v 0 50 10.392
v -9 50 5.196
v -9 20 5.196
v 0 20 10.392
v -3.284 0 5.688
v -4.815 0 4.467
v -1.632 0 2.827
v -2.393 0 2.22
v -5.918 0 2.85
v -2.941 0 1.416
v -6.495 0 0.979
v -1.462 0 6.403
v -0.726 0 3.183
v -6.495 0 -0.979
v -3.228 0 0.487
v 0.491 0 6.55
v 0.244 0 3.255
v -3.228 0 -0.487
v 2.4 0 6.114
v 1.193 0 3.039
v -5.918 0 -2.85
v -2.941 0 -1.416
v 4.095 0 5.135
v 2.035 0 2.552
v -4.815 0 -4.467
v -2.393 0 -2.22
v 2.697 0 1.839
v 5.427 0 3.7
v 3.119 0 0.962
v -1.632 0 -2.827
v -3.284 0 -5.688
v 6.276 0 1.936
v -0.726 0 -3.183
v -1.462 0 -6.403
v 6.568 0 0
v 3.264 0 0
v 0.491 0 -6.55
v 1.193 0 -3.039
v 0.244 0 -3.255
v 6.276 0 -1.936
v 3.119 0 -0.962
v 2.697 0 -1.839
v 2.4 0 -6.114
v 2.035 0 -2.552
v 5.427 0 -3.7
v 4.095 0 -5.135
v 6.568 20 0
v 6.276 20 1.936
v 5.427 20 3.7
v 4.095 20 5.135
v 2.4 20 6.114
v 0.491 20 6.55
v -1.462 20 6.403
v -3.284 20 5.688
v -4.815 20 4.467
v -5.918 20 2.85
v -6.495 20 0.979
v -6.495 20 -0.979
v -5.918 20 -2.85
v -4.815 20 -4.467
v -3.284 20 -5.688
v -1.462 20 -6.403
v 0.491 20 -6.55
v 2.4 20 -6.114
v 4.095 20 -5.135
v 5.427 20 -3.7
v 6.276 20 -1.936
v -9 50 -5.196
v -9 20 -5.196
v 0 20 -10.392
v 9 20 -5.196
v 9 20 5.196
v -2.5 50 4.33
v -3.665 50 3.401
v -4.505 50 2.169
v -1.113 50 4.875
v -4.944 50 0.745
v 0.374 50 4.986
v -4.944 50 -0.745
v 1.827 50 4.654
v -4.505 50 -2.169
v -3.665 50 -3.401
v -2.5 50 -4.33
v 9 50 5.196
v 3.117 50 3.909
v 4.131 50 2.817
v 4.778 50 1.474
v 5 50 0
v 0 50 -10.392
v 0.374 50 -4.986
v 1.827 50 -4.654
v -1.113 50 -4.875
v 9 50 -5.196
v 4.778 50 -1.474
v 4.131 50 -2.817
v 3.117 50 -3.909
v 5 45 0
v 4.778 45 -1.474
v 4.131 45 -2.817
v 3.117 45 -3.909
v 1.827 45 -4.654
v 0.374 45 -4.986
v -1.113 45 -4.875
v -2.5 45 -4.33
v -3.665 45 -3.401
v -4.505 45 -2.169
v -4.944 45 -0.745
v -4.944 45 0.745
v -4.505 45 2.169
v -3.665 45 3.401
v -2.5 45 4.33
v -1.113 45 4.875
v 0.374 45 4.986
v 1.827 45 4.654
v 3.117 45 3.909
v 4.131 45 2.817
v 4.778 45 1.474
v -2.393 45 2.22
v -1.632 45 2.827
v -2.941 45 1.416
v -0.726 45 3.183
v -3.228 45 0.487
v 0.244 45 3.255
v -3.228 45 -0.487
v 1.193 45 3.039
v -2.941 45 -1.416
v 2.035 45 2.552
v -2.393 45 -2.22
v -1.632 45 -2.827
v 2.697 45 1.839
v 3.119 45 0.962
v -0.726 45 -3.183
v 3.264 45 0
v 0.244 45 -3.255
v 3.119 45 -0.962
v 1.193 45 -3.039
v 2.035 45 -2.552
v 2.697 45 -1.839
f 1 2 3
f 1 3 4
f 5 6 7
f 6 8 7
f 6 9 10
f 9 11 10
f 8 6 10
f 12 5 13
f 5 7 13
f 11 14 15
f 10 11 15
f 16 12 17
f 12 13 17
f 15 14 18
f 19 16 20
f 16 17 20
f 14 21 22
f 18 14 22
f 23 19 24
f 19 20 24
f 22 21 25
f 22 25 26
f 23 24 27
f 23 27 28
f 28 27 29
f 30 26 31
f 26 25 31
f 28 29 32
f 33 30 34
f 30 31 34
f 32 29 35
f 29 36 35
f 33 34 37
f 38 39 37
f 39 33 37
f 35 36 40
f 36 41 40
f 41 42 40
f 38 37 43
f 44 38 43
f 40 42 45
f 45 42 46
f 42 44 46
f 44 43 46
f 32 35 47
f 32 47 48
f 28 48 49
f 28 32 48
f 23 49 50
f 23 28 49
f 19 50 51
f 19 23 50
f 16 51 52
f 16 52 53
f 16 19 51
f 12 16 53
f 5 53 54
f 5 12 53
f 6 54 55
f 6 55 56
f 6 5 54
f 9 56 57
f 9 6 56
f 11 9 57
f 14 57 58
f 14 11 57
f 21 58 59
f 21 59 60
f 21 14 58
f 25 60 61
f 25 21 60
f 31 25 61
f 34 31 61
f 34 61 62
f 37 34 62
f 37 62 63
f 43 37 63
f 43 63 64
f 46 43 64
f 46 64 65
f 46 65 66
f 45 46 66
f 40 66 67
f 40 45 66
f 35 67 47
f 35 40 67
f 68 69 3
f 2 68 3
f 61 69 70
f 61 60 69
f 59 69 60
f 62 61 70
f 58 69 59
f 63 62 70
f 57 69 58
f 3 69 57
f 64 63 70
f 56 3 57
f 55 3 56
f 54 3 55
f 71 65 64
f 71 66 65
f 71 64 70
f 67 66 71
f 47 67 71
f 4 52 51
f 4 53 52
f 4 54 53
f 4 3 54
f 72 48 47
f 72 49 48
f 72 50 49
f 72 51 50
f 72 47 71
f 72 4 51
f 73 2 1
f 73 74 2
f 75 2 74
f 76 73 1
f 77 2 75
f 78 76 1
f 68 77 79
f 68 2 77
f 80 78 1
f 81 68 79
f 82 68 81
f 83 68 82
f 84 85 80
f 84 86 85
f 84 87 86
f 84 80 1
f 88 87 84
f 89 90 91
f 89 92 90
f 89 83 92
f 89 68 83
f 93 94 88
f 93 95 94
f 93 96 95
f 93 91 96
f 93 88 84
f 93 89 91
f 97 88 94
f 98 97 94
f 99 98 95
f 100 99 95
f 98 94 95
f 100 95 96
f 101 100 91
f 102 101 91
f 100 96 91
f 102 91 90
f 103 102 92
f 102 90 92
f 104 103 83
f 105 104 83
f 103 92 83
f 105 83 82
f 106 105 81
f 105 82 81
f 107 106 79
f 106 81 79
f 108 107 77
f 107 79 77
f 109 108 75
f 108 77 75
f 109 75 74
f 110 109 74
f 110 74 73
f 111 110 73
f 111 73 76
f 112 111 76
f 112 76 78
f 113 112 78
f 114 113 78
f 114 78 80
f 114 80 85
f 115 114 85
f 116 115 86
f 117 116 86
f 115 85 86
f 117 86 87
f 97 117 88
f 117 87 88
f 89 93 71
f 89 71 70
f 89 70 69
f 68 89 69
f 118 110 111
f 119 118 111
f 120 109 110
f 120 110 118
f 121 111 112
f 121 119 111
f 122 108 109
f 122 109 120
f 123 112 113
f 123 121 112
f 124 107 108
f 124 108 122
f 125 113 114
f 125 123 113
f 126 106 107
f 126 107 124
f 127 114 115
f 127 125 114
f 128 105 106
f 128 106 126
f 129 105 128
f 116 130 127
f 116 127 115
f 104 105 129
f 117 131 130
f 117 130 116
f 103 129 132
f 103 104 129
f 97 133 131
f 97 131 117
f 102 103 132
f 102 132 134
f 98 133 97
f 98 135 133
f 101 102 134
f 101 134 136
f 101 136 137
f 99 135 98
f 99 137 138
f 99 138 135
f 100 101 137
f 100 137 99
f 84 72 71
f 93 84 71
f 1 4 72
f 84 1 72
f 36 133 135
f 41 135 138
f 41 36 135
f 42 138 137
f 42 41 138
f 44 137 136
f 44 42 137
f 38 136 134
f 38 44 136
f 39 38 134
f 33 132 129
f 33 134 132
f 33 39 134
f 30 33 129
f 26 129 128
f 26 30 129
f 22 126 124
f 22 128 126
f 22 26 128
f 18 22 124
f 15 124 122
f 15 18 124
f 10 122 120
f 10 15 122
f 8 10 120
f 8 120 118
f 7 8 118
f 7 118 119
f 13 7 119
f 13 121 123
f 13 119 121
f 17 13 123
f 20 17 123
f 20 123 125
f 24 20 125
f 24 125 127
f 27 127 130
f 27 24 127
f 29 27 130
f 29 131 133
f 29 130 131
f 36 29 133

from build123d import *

# Parameters (mm, degrees)
SKETCH_1_R          = 3.264424224
EXTRUDE_1_DEPTH     = 50
SKETCH_2_OUTSIDE_W  = 31.412
SKETCH_2_OUTSIDE_H  = 34.196
SKETCH_2_OUTSIDE_R  = 6.567936001
CUT_EXTRUDE_1_DEPTH = 20
SKETCH_3_R          = 5
CUT_EXTRUDE_2_DEPTH = 5


with BuildPart() as part:
    # Эскиз1 → Бобышка-Вытянуть1 (new body)
    with BuildSketch(Plane(origin=(0, 0, 0), x_dir=(1, 0, 0), z_dir=(0, 1, 0))):
        Polygon((0, 10.392304845), (-9, 5.196152423), (-9, -5.196152423), (0, -10.392304845), (9, -5.196152423), (9, 5.196152423), align=None)
        Circle(SKETCH_1_R, mode=Mode.SUBTRACT)
    extrude(amount=EXTRUDE_1_DEPTH)

    # Эскиз2 outside → Вырез-Вытянуть1 (cut)
    with BuildSketch(Plane.XZ):
        Rectangle(SKETCH_2_OUTSIDE_W, SKETCH_2_OUTSIDE_H)
        Circle(SKETCH_2_OUTSIDE_R, mode=Mode.SUBTRACT)
    extrude(amount=-CUT_EXTRUDE_1_DEPTH, mode=Mode.SUBTRACT)

    # Эскиз3 → Вырез-Вытянуть2 (cut)
    with BuildSketch(Plane(origin=(0, 50, 0), x_dir=(1, 0, 0), z_dir=(0, 1, 0))):
        Circle(SKETCH_3_R)
    extrude(amount=-CUT_EXTRUDE_2_DEPTH, mode=Mode.SUBTRACT)


solid = part.part
